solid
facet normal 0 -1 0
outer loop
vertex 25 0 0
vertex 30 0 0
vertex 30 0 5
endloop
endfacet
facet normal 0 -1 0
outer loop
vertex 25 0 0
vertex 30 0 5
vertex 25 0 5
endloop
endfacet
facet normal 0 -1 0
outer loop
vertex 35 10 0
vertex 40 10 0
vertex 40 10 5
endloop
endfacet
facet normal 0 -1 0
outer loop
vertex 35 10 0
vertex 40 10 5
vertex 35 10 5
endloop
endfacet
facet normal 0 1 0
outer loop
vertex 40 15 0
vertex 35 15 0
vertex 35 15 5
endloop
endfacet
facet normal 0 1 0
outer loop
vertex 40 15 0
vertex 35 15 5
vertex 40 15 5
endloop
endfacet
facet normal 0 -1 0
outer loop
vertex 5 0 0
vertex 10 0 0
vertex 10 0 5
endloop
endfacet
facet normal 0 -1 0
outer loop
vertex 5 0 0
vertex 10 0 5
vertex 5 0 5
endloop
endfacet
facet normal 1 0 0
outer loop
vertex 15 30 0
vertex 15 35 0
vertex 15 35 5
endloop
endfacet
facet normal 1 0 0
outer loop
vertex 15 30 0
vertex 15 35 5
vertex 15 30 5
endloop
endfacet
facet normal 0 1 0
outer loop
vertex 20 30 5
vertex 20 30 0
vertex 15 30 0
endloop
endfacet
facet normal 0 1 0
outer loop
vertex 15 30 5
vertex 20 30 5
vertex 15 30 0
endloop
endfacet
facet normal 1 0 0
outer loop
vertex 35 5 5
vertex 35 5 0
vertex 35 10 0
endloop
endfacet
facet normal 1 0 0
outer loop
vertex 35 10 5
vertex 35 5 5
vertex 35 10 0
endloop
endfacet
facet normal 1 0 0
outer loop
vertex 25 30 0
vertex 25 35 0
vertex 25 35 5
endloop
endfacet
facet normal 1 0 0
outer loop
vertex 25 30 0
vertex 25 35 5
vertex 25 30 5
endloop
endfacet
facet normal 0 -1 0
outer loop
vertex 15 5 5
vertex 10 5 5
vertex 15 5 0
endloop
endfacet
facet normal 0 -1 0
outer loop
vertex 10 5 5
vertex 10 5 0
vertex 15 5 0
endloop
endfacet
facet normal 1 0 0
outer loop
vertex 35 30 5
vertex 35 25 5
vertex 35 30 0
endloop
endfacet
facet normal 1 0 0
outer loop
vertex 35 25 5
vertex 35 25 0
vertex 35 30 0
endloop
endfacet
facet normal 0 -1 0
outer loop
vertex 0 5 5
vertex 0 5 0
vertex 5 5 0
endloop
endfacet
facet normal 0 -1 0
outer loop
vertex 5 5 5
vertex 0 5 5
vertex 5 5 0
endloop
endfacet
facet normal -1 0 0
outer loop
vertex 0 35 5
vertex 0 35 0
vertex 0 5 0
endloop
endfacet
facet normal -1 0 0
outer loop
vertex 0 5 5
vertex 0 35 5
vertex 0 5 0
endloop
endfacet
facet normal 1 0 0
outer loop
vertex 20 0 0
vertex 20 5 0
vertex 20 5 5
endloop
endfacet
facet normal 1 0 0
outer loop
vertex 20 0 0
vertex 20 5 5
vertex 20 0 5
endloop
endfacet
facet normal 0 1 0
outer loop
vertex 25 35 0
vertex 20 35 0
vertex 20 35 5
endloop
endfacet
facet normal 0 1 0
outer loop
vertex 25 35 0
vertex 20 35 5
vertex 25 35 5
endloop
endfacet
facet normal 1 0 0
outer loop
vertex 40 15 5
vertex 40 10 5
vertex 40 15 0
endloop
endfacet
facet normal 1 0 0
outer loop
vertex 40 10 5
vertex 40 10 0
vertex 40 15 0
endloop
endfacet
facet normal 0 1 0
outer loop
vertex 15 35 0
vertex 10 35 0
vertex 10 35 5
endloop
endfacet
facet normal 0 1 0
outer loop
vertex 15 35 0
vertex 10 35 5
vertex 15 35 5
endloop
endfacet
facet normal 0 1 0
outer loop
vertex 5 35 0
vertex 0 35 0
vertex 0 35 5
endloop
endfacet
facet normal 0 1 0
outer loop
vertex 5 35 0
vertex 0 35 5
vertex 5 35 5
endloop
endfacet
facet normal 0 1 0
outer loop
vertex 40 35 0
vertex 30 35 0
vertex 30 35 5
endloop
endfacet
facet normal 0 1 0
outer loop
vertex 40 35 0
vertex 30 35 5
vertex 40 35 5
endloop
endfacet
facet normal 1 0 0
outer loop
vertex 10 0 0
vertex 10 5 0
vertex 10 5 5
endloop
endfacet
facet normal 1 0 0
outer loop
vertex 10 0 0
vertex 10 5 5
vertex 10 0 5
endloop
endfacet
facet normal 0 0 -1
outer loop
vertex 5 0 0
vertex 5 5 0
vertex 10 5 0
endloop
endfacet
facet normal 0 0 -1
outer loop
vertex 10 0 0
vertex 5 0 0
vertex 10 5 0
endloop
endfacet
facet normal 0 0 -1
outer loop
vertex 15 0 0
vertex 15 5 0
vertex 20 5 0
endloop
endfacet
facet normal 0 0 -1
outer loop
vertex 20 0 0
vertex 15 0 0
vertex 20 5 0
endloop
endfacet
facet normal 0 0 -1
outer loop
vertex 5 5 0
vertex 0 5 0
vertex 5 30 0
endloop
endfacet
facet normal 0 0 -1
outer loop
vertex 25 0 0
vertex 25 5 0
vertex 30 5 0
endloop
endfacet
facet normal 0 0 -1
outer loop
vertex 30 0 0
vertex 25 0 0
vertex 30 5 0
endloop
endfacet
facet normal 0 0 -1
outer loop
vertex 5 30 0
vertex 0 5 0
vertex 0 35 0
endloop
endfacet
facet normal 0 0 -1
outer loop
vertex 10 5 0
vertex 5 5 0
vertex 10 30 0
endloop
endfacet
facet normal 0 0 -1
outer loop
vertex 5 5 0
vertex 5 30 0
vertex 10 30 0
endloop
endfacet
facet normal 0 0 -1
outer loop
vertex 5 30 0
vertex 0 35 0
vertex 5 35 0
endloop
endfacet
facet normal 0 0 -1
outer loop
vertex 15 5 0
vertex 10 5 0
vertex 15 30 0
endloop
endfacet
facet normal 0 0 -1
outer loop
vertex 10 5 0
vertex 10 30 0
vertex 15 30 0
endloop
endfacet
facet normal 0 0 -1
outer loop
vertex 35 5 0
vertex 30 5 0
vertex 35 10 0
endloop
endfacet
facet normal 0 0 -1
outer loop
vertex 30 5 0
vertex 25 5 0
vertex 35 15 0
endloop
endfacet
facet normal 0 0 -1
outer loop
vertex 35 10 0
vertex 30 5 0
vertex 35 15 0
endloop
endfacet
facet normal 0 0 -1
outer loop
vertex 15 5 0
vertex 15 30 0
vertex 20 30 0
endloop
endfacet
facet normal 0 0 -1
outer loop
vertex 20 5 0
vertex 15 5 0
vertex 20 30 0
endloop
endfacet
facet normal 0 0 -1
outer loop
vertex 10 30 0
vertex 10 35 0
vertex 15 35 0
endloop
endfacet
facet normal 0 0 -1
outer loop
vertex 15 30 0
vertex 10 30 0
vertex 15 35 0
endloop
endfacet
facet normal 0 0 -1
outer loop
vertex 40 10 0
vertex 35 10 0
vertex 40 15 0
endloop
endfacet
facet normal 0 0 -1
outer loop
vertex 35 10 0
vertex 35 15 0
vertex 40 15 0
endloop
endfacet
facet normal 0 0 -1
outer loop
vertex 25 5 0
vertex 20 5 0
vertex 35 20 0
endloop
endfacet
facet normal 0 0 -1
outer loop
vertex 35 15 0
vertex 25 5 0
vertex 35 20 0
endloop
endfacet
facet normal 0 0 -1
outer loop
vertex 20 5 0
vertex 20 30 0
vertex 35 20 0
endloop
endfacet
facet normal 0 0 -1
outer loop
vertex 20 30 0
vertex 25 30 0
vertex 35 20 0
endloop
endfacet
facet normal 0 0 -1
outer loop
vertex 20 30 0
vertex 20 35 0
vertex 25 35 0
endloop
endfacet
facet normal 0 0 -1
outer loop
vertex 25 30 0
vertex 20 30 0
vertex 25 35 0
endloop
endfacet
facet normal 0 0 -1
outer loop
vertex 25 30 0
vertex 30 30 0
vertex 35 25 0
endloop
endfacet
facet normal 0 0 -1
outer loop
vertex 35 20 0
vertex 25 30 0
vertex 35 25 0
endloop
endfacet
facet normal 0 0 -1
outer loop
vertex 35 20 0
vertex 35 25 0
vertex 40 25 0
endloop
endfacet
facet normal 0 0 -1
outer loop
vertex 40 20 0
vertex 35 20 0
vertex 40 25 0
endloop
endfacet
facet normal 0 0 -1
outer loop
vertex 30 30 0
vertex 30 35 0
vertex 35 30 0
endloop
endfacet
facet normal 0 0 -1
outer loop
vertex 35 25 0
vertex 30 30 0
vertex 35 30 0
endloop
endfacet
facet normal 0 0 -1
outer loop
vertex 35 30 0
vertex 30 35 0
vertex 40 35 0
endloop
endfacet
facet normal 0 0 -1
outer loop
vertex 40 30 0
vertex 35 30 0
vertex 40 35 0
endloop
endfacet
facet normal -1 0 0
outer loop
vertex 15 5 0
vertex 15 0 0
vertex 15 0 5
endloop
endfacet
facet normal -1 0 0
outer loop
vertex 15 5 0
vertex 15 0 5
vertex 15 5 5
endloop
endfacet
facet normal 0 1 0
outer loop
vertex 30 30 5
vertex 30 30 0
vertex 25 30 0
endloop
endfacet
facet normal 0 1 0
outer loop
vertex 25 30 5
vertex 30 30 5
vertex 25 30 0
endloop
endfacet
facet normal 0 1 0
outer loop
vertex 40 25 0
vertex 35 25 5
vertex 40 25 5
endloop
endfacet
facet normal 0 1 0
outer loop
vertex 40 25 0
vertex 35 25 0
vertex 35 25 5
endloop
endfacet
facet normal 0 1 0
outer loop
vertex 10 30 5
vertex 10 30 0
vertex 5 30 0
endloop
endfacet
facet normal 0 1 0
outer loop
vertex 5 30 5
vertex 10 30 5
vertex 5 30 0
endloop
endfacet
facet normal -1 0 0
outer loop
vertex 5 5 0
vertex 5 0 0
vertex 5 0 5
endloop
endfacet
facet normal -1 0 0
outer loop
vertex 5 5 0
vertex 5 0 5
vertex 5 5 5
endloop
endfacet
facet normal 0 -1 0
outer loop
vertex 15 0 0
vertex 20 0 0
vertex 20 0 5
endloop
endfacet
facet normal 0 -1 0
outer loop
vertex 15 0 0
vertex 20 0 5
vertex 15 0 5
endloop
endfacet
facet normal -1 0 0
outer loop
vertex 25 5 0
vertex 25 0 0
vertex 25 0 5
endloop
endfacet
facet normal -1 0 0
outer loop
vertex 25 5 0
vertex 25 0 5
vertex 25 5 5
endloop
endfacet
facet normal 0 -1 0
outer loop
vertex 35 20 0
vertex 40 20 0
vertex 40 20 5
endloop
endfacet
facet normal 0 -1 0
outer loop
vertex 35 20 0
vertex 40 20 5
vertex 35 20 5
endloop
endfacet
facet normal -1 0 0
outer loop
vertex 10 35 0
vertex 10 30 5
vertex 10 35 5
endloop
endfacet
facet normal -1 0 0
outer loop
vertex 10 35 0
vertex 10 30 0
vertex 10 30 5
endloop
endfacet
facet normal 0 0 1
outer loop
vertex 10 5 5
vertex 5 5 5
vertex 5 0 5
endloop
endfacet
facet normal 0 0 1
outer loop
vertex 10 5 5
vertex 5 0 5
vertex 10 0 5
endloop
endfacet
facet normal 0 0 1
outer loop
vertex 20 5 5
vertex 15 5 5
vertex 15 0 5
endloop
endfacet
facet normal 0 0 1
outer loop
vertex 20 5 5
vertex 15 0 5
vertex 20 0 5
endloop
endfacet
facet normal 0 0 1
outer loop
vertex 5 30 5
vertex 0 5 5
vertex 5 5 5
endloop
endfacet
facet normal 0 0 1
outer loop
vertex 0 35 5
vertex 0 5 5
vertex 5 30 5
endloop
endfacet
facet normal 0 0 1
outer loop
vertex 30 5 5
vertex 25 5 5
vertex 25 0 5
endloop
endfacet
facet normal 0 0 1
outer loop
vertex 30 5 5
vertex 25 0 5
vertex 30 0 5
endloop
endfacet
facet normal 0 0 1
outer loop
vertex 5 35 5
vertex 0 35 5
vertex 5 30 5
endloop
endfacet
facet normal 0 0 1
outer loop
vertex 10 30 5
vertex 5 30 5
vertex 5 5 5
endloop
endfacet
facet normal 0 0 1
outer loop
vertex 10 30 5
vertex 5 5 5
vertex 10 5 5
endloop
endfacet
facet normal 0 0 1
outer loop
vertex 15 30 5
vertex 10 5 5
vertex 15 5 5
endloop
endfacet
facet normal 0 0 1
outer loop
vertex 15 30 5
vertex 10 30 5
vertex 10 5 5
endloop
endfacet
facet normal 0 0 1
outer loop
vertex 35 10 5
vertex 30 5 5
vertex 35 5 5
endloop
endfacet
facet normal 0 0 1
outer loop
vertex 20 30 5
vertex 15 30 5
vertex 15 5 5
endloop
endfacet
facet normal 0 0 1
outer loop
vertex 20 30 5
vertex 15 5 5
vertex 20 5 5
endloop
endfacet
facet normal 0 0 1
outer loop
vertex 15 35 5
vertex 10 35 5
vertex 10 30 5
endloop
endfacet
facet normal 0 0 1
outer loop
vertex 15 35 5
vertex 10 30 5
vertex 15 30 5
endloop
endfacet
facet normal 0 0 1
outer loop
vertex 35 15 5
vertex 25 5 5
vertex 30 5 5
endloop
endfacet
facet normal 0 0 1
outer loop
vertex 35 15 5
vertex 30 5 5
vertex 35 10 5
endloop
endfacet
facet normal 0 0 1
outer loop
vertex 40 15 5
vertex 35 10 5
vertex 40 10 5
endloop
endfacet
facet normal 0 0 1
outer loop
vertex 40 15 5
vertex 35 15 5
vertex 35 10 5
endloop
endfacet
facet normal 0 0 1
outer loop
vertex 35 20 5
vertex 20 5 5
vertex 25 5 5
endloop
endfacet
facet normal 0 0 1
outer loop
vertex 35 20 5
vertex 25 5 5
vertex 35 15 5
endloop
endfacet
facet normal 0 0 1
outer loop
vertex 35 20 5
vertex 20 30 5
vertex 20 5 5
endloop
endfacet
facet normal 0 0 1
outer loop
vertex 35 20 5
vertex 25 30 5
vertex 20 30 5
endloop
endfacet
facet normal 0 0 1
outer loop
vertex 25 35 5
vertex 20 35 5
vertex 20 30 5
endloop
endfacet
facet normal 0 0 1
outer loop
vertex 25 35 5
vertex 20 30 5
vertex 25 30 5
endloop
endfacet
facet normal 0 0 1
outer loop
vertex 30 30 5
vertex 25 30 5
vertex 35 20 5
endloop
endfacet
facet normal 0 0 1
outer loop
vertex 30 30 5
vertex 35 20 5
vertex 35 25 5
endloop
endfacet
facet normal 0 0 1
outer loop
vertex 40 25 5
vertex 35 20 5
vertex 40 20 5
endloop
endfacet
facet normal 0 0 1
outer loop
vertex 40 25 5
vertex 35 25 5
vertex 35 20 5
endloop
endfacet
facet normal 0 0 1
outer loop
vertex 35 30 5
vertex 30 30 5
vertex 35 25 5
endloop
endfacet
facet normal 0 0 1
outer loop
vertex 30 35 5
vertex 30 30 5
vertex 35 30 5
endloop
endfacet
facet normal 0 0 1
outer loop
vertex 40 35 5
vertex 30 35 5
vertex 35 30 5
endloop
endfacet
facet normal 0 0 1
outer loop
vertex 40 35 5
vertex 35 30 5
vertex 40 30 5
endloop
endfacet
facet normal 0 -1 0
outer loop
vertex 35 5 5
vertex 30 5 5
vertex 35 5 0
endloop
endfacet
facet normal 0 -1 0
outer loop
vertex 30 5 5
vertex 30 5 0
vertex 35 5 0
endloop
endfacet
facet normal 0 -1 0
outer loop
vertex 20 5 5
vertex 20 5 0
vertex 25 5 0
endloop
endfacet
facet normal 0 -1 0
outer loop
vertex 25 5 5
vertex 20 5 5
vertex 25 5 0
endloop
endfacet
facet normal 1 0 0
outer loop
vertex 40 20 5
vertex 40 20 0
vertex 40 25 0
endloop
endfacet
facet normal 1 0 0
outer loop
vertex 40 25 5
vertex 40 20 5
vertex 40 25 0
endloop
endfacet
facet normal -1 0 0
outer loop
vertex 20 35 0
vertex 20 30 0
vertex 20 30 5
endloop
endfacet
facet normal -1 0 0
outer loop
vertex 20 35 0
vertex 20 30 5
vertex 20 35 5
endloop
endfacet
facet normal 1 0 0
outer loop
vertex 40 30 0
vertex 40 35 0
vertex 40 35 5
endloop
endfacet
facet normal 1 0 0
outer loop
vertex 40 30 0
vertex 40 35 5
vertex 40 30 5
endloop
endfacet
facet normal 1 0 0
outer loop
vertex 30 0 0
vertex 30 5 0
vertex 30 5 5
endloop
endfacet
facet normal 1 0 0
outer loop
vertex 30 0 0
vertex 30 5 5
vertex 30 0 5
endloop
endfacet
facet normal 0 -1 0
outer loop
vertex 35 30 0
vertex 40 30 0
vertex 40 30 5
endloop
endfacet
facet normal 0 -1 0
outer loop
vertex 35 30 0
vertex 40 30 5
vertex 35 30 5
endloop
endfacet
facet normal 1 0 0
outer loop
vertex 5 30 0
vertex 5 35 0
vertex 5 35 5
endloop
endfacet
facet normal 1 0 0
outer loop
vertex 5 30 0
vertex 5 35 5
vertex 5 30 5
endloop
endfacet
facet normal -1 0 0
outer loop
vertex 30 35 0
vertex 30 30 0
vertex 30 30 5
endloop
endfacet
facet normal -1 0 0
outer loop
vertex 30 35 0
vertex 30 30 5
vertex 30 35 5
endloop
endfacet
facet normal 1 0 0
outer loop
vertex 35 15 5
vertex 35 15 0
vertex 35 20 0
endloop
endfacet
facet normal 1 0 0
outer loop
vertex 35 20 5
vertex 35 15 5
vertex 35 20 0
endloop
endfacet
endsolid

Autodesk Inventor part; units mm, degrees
ref_plane "YZ Plane" through (0, 0, 0) normal (1, 0, 0) x (0, 1, 0)
ref_plane "XZ Plane" through (0, 0, 0) normal (0, 1, 0) x (-1, 0, 0)
ref_plane "XY Plane" through (0, 0, 0) normal (0, 0, 1) x (1, 0, 0)
sketch "Sketch2" plane through (0, 0, 0) normal (0, 0, 1) x (1, 0, 0)
  line L0 (5, 5) -> (10, 5)
  line L1 (10, 5) -> (10, 0)
  line L2 (10, 0) -> (5, 0)
  line L3 (5, 0) -> (5, 5)
  line L4 (0, 5) -> (40, 5)
  line L5 (40, 5) -> (40, 30)
  line L6 (40, 30) -> (0, 30)
  line L7 (0, 30) -> (0, 5)
  line L8 (20, 5) -> (20, 0)
  line L9 (20, 0) -> (15, 0)
  line L10 (15, 0) -> (15, 5)
  line L11 (30, 5) -> (30, 0)
  line L12 (30, 0) -> (25, 0)
  line L13 (25, 0) -> (25, 5)
  line L14 (40, 20) -> (40, 15)
  line L15 (40, 10) -> (40, 5)
  line L16 (40, 30) -> (40, 5)
  line L17 (35, 25) -> (40, 25)
  line L18 (40, 25) -> (40, 20)
  line L19 (40, 20) -> (35, 20)
  line L20 (35, 20) -> (35, 25)
  line L21 (35, 15) -> (40, 15)
  line L22 (40, 15) -> (40, 10)
  line L23 (40, 10) -> (35, 10)
  line L24 (35, 10) -> (35, 15)
  line L25 (10, 30) -> (5, 30)
  line L26 (20, 30) -> (15, 30)
  line L27 (30, 30) -> (25, 30)
  line L28 (40, 30) -> (35, 30)
  line L29 (0, 35) -> (5, 35)
  line L30 (5, 35) -> (5, 30)
  line L31 (5, 30) -> (0, 30)
  line L32 (0, 30) -> (0, 35)
  line L33 (15, 35) -> (15, 30)
  line L34 (15, 30) -> (10, 30)
  line L35 (10, 30) -> (10, 35)
  line L36 (10, 35) -> (15, 35)
  line L37 (25, 35) -> (25, 30)
  line L38 (25, 30) -> (20, 30)
  line L39 (20, 30) -> (20, 35)
  line L40 (20, 35) -> (25, 35)
  line L41 (35, 35) -> (35, 30)
  line L42 (35, 30) -> (30, 30)
  line L43 (30, 30) -> (30, 35)
  line L44 (30, 35) -> (35, 35)
  line L45 (40, 0) -> (35, 0)
  line L46 (35, 0) -> (35, 35)
  line L47 (35, 35) -> (40, 35)
  line L48 (40, 35) -> (40, 0)
  point P0 (0, 0)
  point P1 (35, 5)
  dimension "d105" = 10
  dimension "d110" = 40
  dimension "d115" = 10
extrude "Extrusion3" add sketch "Sketch2" along normal blind 5 contours L4 L7 L6 L46 L20 L24 L0 | L0 L1 L2 L3 | L4 L8 L9 L10 | L32 L29 L30 L6 | L4 L11 L12 L13 | L35 L36 L33 L6 | L39 L40 L37 L6 | L24 L21 L5 L23 | L43 L44 L41 L6 | L20 L17 L5 L19 | L41 L47 L48 L6
properties part number "backside"
